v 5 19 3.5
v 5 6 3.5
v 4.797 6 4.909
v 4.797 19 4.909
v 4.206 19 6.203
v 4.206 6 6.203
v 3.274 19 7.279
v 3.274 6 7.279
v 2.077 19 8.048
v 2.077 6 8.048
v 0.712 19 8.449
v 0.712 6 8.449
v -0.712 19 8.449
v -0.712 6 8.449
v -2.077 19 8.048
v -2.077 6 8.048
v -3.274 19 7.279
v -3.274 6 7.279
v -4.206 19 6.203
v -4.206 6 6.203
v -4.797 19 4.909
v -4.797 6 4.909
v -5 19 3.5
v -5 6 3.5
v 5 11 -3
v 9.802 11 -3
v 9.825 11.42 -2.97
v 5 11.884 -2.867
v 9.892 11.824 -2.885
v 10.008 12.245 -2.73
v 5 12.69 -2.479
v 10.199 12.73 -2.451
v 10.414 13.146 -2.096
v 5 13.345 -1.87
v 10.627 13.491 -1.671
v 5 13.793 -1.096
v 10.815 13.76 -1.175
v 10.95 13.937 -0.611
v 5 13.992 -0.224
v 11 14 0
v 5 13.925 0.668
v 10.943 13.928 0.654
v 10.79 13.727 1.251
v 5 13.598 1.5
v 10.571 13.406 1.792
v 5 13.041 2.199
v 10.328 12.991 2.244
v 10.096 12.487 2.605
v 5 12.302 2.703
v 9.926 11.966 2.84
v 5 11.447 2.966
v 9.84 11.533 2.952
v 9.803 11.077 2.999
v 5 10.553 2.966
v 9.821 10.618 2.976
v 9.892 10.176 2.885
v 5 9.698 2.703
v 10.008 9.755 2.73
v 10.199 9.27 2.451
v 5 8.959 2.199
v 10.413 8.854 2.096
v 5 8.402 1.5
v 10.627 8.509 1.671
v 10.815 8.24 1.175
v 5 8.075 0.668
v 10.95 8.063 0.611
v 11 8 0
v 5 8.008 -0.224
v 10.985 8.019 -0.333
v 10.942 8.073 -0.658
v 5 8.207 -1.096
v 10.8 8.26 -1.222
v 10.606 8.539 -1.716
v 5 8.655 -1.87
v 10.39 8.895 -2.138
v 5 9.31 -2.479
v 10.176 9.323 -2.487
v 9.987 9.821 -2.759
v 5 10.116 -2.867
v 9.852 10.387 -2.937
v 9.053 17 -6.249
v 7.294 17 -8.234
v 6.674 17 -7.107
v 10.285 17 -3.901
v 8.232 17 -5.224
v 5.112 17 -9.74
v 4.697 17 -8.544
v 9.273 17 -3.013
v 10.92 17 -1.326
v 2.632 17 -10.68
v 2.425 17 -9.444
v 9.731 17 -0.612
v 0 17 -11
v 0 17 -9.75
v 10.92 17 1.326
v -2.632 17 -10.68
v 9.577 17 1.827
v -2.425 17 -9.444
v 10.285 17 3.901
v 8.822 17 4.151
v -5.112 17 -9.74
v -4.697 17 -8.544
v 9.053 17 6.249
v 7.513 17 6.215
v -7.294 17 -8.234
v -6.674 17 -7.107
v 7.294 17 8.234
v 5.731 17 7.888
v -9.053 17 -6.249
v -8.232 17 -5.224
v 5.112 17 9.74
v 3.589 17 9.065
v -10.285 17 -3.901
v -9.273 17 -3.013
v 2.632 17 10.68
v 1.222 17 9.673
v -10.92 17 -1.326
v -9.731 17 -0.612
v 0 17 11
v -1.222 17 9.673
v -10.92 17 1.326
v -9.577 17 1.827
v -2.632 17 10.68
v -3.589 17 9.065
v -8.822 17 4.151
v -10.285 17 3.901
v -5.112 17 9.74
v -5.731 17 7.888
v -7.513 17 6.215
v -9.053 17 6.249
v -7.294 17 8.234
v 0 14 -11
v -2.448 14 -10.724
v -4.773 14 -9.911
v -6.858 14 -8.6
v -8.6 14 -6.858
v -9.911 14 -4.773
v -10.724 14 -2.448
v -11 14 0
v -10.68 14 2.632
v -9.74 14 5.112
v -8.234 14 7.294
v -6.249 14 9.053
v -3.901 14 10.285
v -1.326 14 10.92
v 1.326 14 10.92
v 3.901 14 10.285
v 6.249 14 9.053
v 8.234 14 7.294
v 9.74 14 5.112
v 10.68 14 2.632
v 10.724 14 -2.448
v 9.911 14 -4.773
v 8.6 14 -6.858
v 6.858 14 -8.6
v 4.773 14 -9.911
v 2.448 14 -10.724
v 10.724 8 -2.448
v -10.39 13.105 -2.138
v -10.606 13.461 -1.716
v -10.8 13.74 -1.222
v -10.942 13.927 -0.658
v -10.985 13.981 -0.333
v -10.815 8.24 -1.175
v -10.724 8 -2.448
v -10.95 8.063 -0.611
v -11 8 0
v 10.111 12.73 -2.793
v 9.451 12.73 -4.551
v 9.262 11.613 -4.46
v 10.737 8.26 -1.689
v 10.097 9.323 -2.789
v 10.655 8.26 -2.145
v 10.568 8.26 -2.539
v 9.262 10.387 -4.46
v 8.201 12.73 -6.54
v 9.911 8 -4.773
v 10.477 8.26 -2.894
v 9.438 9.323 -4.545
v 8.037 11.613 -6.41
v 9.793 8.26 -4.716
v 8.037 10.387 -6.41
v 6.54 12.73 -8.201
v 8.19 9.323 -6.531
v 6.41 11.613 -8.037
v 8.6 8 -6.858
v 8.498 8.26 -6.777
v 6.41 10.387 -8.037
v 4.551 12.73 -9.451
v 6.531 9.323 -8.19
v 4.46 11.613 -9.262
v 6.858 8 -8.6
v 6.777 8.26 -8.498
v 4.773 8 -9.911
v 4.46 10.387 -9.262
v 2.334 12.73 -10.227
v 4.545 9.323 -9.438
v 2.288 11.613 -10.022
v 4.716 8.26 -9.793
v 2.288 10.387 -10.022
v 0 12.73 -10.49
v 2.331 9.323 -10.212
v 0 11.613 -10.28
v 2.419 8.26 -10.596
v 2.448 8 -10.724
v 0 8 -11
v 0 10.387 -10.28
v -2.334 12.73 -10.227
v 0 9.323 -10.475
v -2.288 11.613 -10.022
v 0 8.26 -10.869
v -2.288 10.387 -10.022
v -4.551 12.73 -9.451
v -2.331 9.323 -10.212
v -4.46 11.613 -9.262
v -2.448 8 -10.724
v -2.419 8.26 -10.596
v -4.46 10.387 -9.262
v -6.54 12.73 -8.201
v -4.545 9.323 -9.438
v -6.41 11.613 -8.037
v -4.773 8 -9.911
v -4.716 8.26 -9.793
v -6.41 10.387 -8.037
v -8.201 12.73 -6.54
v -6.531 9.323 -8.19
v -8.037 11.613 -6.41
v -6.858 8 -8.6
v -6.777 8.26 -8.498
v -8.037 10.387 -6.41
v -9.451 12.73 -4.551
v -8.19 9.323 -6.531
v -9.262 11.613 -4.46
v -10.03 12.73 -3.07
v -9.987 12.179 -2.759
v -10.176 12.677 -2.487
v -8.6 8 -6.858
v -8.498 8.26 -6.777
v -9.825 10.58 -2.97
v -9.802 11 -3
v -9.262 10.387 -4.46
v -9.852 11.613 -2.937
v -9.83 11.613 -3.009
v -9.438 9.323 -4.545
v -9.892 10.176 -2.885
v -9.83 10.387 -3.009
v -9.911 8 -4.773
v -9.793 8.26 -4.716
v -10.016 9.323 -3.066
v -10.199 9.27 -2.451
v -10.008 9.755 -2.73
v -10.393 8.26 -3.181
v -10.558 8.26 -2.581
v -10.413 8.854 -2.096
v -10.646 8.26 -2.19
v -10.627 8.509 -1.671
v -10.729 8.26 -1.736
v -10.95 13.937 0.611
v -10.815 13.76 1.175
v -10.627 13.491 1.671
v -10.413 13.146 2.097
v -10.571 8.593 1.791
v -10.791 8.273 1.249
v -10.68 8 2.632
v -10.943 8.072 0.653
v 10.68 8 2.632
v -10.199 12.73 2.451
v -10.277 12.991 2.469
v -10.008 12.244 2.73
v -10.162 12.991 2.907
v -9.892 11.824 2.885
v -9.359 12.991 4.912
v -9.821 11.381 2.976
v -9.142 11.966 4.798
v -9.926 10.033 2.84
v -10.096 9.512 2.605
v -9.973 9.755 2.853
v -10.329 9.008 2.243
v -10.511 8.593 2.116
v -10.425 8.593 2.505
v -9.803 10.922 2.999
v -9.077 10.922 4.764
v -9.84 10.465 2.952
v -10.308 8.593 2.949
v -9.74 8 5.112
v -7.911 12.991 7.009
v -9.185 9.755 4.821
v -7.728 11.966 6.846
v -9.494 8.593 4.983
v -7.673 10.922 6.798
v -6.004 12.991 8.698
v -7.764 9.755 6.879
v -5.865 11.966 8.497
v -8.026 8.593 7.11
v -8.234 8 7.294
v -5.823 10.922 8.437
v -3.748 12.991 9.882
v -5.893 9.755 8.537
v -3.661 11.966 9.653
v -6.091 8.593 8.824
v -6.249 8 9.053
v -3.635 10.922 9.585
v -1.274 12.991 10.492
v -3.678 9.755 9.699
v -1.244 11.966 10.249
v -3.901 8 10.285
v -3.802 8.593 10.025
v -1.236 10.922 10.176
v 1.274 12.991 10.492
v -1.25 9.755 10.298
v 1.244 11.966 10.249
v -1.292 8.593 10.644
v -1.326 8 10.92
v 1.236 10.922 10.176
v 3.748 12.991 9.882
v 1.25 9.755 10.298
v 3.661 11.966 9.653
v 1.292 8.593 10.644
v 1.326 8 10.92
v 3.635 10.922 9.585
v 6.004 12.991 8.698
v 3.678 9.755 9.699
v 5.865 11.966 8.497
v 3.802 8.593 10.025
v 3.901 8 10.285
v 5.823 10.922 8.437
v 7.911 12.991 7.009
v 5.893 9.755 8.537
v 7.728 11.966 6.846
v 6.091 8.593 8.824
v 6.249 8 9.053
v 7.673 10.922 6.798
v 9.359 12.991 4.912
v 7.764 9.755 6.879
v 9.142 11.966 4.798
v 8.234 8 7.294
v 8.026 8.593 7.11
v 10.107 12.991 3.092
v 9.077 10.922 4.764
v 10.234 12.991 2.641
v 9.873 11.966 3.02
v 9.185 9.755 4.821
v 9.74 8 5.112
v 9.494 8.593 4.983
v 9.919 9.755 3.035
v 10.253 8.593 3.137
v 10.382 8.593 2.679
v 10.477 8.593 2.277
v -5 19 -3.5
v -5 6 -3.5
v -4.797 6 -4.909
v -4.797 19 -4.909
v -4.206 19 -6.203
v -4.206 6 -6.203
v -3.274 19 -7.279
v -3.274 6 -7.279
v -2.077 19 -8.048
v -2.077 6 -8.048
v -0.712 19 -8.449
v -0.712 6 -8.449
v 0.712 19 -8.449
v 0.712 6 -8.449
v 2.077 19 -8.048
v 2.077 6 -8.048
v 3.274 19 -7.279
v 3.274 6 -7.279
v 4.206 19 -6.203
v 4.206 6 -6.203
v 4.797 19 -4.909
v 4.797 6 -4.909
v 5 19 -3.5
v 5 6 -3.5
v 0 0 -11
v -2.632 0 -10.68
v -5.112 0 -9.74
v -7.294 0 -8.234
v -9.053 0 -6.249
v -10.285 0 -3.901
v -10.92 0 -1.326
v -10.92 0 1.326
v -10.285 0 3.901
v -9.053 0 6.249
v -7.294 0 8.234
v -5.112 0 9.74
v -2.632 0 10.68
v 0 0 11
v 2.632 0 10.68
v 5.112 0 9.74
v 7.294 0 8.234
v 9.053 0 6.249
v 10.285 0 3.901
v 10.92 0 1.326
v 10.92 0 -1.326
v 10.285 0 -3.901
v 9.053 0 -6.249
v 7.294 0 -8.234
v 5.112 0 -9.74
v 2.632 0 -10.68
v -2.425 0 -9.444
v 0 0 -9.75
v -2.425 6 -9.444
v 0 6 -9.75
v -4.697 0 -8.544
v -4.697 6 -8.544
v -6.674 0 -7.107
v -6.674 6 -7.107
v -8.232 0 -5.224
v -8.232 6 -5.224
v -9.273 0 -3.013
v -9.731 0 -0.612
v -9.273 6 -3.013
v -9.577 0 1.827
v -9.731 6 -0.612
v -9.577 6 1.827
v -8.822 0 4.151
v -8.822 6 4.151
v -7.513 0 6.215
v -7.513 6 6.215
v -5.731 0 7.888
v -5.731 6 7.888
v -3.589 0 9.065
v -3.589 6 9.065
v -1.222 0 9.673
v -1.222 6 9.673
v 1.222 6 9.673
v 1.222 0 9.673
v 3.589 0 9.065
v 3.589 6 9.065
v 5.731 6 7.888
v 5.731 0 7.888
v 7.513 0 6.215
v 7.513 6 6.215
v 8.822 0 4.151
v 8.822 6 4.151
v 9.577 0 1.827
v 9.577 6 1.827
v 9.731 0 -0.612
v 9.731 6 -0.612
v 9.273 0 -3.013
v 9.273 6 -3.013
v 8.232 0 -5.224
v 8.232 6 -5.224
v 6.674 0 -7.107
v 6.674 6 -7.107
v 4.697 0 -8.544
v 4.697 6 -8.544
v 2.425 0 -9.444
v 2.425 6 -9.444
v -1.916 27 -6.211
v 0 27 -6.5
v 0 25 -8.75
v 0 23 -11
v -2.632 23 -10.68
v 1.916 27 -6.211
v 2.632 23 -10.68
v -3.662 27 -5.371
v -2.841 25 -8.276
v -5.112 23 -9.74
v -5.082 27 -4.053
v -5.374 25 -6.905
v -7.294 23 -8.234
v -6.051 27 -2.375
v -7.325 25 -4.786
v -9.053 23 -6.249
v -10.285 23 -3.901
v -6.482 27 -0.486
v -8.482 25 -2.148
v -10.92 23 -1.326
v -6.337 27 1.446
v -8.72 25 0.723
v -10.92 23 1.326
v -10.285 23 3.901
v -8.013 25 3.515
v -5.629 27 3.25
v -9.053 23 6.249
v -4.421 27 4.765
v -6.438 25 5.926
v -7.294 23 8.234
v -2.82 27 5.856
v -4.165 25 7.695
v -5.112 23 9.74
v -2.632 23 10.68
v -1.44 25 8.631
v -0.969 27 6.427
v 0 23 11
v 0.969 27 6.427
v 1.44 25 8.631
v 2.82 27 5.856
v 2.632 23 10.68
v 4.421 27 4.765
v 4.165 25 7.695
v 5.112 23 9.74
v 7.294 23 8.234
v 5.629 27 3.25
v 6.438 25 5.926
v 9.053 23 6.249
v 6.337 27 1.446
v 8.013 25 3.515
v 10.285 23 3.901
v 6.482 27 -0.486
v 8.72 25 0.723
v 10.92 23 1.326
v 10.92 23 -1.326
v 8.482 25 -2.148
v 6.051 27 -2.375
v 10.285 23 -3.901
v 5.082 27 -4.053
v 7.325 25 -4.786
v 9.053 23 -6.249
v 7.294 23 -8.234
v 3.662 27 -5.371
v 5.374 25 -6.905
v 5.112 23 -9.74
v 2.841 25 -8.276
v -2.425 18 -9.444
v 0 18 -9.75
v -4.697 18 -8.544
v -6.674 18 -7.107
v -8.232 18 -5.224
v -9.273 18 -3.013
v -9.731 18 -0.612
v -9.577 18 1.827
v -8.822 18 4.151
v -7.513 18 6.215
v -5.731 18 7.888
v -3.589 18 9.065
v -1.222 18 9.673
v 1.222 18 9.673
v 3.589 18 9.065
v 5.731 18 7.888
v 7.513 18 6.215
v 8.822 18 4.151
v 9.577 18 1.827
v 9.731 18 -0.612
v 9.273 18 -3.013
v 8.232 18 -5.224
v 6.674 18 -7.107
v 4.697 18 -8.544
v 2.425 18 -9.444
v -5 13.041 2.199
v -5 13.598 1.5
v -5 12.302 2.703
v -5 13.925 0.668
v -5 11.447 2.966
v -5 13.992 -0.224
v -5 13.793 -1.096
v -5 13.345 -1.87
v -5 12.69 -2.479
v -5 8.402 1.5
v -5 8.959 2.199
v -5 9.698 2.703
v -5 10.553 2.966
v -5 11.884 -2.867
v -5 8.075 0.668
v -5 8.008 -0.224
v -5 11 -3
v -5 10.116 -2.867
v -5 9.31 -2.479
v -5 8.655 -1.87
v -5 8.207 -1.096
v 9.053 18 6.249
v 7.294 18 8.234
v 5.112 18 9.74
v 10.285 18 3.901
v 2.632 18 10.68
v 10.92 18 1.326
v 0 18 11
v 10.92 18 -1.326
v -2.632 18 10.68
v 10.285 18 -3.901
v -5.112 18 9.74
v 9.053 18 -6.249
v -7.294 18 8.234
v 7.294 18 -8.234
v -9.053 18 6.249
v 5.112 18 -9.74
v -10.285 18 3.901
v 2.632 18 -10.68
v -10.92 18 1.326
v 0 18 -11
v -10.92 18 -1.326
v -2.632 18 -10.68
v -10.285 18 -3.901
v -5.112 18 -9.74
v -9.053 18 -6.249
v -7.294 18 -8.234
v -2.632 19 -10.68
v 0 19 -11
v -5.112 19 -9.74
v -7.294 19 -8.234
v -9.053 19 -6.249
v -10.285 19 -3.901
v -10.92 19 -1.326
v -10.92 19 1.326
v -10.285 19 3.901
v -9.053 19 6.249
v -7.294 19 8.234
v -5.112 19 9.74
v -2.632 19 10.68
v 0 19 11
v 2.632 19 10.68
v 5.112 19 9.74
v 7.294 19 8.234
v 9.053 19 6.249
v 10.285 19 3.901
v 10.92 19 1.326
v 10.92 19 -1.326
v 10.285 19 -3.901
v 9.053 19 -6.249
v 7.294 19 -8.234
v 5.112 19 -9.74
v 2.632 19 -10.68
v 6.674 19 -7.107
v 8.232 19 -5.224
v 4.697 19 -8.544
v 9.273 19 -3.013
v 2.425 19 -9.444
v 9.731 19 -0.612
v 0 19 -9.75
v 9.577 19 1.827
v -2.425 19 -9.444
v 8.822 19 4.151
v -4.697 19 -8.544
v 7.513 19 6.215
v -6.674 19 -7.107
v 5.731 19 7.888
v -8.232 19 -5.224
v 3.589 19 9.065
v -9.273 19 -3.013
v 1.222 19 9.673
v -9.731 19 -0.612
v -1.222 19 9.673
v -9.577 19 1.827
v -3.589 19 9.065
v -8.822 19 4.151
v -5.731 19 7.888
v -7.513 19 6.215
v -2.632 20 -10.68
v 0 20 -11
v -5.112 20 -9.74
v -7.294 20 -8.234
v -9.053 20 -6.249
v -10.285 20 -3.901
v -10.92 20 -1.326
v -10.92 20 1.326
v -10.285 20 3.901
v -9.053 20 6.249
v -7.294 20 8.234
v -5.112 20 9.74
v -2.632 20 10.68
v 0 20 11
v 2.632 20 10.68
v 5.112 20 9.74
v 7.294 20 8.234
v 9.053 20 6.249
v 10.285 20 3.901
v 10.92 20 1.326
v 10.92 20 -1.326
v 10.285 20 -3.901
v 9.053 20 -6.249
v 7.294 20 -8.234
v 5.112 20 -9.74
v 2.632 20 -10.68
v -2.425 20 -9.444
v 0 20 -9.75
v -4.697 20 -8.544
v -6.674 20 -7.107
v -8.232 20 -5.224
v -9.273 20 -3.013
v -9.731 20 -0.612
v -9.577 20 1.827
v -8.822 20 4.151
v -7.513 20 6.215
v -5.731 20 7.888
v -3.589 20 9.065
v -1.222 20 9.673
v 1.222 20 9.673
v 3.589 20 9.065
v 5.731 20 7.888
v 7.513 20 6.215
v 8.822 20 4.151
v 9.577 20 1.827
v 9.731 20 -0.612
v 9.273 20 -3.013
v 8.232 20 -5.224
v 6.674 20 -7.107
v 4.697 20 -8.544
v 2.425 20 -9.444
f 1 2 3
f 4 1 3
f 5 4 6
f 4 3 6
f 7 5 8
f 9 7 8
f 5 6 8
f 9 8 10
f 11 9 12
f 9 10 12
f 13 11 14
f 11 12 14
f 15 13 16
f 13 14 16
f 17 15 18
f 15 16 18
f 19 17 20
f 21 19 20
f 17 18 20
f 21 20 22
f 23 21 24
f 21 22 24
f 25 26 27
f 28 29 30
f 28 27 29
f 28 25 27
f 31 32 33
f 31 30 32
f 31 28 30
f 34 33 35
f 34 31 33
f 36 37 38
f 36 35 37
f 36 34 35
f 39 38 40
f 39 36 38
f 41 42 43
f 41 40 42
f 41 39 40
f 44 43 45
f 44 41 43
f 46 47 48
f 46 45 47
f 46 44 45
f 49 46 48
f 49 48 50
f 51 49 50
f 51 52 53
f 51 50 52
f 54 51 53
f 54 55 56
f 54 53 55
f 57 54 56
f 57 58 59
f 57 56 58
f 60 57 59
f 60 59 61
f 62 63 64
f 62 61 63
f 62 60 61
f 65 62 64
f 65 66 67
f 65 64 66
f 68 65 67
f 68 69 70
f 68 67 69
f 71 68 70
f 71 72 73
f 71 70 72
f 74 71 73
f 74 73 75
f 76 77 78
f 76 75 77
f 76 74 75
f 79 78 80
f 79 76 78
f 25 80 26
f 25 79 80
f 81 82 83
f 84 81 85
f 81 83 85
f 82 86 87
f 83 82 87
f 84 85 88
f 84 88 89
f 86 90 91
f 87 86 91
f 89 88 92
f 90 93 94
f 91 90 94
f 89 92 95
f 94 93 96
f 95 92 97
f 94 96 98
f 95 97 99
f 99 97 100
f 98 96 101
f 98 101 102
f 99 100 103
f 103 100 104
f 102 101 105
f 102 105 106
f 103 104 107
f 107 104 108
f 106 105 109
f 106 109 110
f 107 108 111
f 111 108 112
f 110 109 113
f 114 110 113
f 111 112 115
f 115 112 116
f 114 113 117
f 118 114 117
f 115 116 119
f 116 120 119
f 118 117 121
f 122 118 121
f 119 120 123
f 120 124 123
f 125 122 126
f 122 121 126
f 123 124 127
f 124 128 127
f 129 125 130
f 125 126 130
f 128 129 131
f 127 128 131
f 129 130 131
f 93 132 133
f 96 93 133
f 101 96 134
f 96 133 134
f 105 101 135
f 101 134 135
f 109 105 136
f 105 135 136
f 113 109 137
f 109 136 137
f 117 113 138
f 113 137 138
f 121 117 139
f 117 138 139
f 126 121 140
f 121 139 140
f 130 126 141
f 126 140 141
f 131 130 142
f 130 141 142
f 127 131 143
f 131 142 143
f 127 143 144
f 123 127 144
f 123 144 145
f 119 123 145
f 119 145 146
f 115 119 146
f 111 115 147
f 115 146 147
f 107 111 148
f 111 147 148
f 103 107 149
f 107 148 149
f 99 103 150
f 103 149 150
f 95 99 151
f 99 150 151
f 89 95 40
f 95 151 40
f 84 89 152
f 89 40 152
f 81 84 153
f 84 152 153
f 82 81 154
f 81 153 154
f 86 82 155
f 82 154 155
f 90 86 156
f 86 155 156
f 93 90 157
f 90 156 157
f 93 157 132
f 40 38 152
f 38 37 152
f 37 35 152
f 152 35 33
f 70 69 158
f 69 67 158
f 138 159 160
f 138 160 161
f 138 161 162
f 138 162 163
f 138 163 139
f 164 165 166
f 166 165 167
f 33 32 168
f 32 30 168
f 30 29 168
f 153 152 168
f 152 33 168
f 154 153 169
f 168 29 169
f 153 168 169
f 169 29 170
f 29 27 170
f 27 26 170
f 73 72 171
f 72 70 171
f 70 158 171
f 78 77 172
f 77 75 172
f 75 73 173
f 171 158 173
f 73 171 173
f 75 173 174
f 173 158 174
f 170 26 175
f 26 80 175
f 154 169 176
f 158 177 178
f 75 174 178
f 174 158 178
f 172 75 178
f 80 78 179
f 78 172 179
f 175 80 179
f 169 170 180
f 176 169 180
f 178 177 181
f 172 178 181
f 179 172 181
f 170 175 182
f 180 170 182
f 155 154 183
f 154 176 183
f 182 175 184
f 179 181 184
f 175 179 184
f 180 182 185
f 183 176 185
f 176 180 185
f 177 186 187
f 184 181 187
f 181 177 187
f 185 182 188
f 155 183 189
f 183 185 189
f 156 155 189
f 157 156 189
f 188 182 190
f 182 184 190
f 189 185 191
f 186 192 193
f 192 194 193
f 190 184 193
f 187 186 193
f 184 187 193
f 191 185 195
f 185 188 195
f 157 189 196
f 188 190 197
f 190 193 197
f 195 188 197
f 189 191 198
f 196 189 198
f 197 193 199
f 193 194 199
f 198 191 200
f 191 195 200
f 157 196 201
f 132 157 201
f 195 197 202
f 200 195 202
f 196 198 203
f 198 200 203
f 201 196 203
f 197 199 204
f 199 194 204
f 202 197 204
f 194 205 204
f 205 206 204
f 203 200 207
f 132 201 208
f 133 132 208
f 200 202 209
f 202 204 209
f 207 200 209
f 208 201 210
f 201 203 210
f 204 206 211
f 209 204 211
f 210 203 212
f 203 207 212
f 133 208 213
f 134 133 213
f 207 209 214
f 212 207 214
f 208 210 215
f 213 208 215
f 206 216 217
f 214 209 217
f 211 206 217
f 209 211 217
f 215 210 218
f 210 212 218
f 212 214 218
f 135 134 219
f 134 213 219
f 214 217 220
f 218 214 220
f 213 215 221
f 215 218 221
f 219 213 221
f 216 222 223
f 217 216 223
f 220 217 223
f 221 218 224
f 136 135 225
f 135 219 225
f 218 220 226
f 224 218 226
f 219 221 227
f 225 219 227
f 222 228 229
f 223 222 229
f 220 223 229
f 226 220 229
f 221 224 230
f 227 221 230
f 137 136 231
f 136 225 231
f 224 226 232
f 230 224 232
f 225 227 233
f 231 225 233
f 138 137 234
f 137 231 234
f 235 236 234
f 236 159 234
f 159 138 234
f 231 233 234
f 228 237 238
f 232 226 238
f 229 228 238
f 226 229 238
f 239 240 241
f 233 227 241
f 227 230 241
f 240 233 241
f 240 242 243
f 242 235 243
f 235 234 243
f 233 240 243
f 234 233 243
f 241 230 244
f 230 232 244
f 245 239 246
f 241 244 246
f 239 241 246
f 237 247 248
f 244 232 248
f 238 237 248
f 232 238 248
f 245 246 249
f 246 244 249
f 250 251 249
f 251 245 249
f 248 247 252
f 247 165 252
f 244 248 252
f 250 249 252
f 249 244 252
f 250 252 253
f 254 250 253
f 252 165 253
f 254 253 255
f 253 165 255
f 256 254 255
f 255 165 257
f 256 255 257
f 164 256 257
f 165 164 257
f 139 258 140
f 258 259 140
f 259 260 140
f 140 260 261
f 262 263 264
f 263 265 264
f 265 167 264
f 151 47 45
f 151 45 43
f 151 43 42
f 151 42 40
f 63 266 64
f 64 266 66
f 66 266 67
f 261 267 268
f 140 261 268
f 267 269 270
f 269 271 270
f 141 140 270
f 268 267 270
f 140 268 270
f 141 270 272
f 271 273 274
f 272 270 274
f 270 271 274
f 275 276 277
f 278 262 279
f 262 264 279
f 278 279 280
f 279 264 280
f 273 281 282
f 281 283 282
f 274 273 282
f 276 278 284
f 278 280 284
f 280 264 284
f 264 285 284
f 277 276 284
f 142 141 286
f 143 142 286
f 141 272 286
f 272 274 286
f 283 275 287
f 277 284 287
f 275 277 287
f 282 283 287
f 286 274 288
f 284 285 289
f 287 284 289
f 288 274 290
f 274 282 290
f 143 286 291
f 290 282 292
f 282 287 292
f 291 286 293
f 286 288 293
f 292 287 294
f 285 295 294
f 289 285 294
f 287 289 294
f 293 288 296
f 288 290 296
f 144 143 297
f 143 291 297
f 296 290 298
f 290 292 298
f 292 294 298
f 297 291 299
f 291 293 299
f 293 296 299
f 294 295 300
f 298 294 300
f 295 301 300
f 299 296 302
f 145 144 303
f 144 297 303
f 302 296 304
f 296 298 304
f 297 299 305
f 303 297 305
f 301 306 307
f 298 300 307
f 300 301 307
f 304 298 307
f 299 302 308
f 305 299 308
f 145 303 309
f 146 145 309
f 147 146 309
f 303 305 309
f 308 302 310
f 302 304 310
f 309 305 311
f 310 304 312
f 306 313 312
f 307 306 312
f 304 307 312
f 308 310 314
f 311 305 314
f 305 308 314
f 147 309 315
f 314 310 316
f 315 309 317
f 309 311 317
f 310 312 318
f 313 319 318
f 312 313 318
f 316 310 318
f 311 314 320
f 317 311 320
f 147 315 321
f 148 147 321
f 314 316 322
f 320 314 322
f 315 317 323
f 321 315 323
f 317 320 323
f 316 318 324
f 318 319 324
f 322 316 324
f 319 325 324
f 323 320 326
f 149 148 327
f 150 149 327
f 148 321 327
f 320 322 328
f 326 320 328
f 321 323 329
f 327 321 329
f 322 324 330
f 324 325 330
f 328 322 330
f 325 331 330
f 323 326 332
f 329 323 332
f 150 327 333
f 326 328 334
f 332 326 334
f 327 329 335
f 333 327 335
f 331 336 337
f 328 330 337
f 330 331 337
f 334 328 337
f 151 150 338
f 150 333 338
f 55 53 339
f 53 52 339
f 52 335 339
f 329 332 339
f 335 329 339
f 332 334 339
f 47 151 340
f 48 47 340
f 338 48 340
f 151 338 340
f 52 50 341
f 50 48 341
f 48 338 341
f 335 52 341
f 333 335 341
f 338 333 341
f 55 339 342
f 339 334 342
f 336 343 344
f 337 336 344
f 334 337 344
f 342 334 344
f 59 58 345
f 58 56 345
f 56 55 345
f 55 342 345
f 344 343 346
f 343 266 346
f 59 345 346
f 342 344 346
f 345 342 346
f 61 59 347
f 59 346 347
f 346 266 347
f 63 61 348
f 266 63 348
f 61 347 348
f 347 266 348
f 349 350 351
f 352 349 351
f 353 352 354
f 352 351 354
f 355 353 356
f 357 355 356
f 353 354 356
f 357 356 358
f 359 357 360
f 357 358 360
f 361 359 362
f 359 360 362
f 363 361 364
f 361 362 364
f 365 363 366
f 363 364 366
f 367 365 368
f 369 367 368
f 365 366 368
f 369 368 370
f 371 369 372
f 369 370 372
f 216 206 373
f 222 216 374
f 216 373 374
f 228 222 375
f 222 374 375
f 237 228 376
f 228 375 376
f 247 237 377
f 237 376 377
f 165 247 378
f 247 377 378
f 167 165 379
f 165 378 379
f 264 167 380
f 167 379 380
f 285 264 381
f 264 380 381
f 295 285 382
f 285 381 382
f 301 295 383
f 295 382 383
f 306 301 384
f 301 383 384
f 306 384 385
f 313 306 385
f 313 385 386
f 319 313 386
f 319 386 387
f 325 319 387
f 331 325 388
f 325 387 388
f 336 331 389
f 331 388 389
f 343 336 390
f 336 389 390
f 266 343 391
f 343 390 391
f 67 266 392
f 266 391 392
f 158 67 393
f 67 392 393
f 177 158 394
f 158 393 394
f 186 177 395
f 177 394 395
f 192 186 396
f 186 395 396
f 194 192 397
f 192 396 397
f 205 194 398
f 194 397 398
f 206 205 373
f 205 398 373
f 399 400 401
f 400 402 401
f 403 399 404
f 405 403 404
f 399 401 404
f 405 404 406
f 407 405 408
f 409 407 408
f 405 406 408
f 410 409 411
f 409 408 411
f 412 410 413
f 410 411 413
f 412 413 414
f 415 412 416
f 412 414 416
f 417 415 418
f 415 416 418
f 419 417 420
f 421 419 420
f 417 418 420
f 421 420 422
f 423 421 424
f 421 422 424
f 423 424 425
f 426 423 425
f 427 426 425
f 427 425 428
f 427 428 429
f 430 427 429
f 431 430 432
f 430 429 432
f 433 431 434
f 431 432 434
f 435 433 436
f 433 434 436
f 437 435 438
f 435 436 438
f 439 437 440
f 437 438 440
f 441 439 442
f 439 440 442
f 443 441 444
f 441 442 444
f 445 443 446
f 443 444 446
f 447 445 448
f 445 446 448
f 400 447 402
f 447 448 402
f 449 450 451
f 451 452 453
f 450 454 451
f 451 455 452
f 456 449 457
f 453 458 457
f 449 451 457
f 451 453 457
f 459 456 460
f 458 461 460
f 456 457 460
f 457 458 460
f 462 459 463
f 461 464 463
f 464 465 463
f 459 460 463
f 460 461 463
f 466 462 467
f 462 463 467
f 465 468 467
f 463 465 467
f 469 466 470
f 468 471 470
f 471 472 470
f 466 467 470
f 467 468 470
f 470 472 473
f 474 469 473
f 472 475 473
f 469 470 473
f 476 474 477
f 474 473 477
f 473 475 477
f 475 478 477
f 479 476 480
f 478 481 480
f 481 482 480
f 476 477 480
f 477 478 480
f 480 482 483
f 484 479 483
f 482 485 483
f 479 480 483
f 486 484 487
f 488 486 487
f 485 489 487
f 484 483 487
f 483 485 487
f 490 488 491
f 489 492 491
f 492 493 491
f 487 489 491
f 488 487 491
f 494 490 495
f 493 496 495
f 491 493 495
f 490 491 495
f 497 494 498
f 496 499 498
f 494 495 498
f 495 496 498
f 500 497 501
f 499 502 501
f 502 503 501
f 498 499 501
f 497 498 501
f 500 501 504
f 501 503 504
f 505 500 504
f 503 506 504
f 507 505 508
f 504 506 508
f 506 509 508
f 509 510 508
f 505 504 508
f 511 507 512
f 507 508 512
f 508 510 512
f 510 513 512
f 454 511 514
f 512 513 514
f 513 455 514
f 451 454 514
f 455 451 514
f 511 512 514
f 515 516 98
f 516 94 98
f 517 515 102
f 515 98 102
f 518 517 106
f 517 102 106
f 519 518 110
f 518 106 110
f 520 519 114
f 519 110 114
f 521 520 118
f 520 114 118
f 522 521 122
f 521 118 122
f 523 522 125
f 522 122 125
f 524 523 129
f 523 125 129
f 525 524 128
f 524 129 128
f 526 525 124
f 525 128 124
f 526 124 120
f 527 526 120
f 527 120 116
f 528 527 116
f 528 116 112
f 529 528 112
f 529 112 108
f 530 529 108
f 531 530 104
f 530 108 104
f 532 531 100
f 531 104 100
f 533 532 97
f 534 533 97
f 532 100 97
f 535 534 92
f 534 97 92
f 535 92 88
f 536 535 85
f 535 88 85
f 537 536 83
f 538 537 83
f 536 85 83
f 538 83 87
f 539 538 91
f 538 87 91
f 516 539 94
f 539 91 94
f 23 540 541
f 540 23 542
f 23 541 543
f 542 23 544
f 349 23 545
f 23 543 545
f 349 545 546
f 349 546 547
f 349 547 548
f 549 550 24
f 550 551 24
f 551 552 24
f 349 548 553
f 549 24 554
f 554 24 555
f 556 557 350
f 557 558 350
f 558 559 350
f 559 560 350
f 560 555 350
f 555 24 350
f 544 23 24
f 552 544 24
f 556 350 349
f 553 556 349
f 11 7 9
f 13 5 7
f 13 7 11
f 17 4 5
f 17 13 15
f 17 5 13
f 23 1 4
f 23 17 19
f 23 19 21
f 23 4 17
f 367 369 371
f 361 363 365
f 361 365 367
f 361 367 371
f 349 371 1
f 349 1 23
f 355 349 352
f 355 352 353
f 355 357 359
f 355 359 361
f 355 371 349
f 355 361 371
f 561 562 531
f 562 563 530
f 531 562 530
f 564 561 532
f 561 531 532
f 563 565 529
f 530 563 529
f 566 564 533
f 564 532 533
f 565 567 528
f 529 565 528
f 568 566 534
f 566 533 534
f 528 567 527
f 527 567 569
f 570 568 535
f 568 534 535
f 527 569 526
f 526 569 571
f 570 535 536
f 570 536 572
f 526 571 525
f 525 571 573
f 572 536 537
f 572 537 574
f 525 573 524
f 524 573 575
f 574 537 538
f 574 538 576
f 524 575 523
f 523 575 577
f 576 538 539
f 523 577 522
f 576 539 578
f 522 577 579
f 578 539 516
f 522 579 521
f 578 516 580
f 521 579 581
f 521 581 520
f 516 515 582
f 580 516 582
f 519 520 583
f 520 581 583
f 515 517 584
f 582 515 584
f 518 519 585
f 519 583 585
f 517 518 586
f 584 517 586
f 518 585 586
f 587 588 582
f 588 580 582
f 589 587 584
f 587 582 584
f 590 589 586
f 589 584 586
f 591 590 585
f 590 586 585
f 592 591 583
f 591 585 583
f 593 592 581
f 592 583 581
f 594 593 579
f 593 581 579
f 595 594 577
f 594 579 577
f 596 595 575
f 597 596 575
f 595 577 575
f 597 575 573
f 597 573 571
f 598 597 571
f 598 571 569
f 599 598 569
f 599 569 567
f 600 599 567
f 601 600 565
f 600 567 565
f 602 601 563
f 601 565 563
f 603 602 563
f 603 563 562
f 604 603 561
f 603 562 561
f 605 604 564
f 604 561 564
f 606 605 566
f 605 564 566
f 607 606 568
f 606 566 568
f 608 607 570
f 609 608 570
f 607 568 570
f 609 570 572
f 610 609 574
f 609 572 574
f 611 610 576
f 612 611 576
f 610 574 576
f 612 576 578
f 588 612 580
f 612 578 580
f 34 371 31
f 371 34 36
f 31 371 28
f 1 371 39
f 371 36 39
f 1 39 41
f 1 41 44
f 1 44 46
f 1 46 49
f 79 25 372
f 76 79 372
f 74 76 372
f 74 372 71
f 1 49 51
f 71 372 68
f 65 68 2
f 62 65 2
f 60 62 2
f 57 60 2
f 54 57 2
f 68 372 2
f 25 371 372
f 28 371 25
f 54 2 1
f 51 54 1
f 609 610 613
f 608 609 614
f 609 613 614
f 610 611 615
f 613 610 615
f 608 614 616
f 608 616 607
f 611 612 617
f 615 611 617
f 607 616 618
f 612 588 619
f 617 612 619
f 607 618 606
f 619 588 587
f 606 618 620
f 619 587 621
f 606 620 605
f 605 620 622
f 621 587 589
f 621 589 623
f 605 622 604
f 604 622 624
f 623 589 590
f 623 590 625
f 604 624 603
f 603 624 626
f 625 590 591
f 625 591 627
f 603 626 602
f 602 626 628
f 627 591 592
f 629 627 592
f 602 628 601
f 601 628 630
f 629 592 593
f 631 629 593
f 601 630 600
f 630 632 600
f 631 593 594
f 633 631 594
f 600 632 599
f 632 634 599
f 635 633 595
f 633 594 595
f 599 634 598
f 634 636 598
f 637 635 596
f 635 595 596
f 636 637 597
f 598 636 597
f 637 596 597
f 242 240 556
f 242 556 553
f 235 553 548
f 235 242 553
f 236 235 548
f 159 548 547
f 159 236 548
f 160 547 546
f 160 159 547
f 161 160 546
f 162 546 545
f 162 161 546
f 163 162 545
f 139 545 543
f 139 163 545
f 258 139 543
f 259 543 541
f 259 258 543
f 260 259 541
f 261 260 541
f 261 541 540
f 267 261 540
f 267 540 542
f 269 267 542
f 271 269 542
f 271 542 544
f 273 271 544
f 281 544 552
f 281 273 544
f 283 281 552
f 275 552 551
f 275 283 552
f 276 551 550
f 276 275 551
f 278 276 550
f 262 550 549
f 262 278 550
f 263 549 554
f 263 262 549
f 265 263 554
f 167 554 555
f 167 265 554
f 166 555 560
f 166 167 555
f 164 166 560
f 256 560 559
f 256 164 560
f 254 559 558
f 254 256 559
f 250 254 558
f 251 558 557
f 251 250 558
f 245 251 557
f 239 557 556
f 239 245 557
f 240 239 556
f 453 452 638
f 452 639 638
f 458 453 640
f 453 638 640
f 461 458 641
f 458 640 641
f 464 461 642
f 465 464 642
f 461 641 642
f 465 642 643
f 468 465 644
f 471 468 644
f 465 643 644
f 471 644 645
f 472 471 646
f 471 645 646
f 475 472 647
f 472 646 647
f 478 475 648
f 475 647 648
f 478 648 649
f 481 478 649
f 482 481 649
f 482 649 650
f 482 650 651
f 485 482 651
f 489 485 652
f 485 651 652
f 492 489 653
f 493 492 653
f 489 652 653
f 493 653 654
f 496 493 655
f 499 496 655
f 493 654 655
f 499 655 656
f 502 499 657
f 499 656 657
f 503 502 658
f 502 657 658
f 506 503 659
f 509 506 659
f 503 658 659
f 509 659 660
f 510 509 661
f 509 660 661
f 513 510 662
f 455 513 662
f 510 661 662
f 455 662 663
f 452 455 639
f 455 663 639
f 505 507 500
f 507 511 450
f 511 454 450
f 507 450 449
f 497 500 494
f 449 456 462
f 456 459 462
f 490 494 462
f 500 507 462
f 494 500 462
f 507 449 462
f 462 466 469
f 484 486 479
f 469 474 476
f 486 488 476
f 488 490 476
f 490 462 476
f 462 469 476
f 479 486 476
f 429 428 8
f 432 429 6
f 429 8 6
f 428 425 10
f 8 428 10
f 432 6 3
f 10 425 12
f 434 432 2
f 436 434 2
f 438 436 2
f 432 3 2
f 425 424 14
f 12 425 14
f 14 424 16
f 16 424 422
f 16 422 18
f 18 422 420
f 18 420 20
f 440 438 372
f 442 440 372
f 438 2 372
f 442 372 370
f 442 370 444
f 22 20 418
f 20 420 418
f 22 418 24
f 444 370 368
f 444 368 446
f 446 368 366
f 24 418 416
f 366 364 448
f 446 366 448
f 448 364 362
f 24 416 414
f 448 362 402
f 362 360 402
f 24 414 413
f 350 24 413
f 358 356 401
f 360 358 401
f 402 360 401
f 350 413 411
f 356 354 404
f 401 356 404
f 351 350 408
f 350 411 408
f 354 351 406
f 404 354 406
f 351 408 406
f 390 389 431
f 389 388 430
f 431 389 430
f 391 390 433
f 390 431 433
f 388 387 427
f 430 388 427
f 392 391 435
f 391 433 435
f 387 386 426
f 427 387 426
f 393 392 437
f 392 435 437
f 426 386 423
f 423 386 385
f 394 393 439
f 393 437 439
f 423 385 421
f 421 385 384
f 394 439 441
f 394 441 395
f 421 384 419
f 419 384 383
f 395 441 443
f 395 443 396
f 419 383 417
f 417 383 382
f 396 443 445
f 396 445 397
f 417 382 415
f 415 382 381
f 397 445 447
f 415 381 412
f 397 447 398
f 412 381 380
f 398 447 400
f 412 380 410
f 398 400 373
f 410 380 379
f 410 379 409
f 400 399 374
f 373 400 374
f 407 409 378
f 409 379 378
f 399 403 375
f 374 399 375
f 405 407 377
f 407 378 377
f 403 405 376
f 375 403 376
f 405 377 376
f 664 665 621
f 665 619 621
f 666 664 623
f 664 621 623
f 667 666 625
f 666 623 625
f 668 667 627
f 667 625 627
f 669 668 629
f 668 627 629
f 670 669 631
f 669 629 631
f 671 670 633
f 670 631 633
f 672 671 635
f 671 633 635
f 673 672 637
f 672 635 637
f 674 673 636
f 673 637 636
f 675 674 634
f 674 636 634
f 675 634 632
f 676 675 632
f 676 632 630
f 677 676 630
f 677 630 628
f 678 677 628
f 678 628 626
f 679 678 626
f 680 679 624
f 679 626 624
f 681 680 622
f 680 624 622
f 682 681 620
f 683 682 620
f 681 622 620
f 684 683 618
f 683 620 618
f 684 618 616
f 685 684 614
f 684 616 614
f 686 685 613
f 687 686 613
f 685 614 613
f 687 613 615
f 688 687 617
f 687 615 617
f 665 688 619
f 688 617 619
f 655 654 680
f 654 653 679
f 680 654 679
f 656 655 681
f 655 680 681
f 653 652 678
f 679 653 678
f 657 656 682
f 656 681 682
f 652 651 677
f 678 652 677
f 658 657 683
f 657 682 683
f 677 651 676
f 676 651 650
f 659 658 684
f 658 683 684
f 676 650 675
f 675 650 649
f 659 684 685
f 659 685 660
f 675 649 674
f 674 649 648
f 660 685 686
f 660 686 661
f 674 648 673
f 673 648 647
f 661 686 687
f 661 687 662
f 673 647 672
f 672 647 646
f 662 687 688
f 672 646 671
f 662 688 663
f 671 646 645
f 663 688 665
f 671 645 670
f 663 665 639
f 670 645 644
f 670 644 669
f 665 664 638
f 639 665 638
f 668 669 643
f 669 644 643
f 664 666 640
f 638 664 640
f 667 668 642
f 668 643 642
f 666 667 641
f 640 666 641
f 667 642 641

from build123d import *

# Parameters (mm, degrees)
CUT_EXTRUDE1_DEPTH      = 19
CUT_EXTRUDE2_DEPTH      = 32.160872902
CUT_EXTRUDE2_DEPTH_BACK = 32.160872902
SKETCH3_R               = 3


with BuildPart() as part:
    # Sketch1 → Revolve1 (revolve)
    with BuildSketch(Plane.XY, mode=Mode.PRIVATE) as revolve1_sk:
        with BuildLine():
            Line((0, 27), (-6.5, 27))
            Line((-6.5, 27), (-11, 23))
            Line((-11, 23), (-11, 20))
            Line((-11, 20), (-9.75, 20))
            Line((-9.75, 20), (-9.75, 19))
            Line((-9.75, 19), (-11, 19))
            Line((-11, 19), (-11, 18))
            Line((-11, 18), (-9.75, 18))
            Line((-9.75, 18), (-9.75, 17))
            Line((-9.75, 17), (-11, 17))
            Line((-11, 17), (-11, 14))
            ThreePointArc((-11, 14), (-10.250666035, 11), (-11, 8))
            Line((-11, 8), (-11, 0))
            Line((-11, 0), (-9.75, 0))
            Line((-9.75, 0), (-9.75, 6))
            Line((-9.75, 6), (0, 6))
            Line((0, 6), (0, 27))
        make_face()
    revolve(revolve1_sk.sketch.rotate(Axis((0, -30.957446809, 0), (0, 1, 0)), 270), axis=Axis((0, -30.957446809, 0), (0, 1, 0)))

    # Sketch2 → Cut-Extrude1 (cut)
    with BuildSketch(Plane(origin=(0, 0, 0), x_dir=(1, 0, 0), z_dir=(0, 1, 0))):
        with BuildLine():
            Line((-5, -3.5), (-5, 3.5))
            ThreePointArc((-5, 3.5), (0, 8.5), (5, 3.5))
            Line((5, 3.5), (5, -3.5))
            ThreePointArc((5, -3.5), (0, -8.5), (-5, -3.5))
        make_face()
    extrude(amount=CUT_EXTRUDE1_DEPTH, mode=Mode.SUBTRACT)

    # Sketch3 → Cut-Extrude2 (cut, two sides: drawn at the far end of the back side and taken through both)
    with BuildSketch(Plane(origin=(0, 0, 0), x_dir=(0, 0, -1), z_dir=(1, 0, 0)).offset(-CUT_EXTRUDE2_DEPTH_BACK)):
        with Locations((0, 11)):
            Circle(SKETCH3_R)
    extrude(amount=CUT_EXTRUDE2_DEPTH + CUT_EXTRUDE2_DEPTH_BACK, mode=Mode.SUBTRACT)


solid = part.part
